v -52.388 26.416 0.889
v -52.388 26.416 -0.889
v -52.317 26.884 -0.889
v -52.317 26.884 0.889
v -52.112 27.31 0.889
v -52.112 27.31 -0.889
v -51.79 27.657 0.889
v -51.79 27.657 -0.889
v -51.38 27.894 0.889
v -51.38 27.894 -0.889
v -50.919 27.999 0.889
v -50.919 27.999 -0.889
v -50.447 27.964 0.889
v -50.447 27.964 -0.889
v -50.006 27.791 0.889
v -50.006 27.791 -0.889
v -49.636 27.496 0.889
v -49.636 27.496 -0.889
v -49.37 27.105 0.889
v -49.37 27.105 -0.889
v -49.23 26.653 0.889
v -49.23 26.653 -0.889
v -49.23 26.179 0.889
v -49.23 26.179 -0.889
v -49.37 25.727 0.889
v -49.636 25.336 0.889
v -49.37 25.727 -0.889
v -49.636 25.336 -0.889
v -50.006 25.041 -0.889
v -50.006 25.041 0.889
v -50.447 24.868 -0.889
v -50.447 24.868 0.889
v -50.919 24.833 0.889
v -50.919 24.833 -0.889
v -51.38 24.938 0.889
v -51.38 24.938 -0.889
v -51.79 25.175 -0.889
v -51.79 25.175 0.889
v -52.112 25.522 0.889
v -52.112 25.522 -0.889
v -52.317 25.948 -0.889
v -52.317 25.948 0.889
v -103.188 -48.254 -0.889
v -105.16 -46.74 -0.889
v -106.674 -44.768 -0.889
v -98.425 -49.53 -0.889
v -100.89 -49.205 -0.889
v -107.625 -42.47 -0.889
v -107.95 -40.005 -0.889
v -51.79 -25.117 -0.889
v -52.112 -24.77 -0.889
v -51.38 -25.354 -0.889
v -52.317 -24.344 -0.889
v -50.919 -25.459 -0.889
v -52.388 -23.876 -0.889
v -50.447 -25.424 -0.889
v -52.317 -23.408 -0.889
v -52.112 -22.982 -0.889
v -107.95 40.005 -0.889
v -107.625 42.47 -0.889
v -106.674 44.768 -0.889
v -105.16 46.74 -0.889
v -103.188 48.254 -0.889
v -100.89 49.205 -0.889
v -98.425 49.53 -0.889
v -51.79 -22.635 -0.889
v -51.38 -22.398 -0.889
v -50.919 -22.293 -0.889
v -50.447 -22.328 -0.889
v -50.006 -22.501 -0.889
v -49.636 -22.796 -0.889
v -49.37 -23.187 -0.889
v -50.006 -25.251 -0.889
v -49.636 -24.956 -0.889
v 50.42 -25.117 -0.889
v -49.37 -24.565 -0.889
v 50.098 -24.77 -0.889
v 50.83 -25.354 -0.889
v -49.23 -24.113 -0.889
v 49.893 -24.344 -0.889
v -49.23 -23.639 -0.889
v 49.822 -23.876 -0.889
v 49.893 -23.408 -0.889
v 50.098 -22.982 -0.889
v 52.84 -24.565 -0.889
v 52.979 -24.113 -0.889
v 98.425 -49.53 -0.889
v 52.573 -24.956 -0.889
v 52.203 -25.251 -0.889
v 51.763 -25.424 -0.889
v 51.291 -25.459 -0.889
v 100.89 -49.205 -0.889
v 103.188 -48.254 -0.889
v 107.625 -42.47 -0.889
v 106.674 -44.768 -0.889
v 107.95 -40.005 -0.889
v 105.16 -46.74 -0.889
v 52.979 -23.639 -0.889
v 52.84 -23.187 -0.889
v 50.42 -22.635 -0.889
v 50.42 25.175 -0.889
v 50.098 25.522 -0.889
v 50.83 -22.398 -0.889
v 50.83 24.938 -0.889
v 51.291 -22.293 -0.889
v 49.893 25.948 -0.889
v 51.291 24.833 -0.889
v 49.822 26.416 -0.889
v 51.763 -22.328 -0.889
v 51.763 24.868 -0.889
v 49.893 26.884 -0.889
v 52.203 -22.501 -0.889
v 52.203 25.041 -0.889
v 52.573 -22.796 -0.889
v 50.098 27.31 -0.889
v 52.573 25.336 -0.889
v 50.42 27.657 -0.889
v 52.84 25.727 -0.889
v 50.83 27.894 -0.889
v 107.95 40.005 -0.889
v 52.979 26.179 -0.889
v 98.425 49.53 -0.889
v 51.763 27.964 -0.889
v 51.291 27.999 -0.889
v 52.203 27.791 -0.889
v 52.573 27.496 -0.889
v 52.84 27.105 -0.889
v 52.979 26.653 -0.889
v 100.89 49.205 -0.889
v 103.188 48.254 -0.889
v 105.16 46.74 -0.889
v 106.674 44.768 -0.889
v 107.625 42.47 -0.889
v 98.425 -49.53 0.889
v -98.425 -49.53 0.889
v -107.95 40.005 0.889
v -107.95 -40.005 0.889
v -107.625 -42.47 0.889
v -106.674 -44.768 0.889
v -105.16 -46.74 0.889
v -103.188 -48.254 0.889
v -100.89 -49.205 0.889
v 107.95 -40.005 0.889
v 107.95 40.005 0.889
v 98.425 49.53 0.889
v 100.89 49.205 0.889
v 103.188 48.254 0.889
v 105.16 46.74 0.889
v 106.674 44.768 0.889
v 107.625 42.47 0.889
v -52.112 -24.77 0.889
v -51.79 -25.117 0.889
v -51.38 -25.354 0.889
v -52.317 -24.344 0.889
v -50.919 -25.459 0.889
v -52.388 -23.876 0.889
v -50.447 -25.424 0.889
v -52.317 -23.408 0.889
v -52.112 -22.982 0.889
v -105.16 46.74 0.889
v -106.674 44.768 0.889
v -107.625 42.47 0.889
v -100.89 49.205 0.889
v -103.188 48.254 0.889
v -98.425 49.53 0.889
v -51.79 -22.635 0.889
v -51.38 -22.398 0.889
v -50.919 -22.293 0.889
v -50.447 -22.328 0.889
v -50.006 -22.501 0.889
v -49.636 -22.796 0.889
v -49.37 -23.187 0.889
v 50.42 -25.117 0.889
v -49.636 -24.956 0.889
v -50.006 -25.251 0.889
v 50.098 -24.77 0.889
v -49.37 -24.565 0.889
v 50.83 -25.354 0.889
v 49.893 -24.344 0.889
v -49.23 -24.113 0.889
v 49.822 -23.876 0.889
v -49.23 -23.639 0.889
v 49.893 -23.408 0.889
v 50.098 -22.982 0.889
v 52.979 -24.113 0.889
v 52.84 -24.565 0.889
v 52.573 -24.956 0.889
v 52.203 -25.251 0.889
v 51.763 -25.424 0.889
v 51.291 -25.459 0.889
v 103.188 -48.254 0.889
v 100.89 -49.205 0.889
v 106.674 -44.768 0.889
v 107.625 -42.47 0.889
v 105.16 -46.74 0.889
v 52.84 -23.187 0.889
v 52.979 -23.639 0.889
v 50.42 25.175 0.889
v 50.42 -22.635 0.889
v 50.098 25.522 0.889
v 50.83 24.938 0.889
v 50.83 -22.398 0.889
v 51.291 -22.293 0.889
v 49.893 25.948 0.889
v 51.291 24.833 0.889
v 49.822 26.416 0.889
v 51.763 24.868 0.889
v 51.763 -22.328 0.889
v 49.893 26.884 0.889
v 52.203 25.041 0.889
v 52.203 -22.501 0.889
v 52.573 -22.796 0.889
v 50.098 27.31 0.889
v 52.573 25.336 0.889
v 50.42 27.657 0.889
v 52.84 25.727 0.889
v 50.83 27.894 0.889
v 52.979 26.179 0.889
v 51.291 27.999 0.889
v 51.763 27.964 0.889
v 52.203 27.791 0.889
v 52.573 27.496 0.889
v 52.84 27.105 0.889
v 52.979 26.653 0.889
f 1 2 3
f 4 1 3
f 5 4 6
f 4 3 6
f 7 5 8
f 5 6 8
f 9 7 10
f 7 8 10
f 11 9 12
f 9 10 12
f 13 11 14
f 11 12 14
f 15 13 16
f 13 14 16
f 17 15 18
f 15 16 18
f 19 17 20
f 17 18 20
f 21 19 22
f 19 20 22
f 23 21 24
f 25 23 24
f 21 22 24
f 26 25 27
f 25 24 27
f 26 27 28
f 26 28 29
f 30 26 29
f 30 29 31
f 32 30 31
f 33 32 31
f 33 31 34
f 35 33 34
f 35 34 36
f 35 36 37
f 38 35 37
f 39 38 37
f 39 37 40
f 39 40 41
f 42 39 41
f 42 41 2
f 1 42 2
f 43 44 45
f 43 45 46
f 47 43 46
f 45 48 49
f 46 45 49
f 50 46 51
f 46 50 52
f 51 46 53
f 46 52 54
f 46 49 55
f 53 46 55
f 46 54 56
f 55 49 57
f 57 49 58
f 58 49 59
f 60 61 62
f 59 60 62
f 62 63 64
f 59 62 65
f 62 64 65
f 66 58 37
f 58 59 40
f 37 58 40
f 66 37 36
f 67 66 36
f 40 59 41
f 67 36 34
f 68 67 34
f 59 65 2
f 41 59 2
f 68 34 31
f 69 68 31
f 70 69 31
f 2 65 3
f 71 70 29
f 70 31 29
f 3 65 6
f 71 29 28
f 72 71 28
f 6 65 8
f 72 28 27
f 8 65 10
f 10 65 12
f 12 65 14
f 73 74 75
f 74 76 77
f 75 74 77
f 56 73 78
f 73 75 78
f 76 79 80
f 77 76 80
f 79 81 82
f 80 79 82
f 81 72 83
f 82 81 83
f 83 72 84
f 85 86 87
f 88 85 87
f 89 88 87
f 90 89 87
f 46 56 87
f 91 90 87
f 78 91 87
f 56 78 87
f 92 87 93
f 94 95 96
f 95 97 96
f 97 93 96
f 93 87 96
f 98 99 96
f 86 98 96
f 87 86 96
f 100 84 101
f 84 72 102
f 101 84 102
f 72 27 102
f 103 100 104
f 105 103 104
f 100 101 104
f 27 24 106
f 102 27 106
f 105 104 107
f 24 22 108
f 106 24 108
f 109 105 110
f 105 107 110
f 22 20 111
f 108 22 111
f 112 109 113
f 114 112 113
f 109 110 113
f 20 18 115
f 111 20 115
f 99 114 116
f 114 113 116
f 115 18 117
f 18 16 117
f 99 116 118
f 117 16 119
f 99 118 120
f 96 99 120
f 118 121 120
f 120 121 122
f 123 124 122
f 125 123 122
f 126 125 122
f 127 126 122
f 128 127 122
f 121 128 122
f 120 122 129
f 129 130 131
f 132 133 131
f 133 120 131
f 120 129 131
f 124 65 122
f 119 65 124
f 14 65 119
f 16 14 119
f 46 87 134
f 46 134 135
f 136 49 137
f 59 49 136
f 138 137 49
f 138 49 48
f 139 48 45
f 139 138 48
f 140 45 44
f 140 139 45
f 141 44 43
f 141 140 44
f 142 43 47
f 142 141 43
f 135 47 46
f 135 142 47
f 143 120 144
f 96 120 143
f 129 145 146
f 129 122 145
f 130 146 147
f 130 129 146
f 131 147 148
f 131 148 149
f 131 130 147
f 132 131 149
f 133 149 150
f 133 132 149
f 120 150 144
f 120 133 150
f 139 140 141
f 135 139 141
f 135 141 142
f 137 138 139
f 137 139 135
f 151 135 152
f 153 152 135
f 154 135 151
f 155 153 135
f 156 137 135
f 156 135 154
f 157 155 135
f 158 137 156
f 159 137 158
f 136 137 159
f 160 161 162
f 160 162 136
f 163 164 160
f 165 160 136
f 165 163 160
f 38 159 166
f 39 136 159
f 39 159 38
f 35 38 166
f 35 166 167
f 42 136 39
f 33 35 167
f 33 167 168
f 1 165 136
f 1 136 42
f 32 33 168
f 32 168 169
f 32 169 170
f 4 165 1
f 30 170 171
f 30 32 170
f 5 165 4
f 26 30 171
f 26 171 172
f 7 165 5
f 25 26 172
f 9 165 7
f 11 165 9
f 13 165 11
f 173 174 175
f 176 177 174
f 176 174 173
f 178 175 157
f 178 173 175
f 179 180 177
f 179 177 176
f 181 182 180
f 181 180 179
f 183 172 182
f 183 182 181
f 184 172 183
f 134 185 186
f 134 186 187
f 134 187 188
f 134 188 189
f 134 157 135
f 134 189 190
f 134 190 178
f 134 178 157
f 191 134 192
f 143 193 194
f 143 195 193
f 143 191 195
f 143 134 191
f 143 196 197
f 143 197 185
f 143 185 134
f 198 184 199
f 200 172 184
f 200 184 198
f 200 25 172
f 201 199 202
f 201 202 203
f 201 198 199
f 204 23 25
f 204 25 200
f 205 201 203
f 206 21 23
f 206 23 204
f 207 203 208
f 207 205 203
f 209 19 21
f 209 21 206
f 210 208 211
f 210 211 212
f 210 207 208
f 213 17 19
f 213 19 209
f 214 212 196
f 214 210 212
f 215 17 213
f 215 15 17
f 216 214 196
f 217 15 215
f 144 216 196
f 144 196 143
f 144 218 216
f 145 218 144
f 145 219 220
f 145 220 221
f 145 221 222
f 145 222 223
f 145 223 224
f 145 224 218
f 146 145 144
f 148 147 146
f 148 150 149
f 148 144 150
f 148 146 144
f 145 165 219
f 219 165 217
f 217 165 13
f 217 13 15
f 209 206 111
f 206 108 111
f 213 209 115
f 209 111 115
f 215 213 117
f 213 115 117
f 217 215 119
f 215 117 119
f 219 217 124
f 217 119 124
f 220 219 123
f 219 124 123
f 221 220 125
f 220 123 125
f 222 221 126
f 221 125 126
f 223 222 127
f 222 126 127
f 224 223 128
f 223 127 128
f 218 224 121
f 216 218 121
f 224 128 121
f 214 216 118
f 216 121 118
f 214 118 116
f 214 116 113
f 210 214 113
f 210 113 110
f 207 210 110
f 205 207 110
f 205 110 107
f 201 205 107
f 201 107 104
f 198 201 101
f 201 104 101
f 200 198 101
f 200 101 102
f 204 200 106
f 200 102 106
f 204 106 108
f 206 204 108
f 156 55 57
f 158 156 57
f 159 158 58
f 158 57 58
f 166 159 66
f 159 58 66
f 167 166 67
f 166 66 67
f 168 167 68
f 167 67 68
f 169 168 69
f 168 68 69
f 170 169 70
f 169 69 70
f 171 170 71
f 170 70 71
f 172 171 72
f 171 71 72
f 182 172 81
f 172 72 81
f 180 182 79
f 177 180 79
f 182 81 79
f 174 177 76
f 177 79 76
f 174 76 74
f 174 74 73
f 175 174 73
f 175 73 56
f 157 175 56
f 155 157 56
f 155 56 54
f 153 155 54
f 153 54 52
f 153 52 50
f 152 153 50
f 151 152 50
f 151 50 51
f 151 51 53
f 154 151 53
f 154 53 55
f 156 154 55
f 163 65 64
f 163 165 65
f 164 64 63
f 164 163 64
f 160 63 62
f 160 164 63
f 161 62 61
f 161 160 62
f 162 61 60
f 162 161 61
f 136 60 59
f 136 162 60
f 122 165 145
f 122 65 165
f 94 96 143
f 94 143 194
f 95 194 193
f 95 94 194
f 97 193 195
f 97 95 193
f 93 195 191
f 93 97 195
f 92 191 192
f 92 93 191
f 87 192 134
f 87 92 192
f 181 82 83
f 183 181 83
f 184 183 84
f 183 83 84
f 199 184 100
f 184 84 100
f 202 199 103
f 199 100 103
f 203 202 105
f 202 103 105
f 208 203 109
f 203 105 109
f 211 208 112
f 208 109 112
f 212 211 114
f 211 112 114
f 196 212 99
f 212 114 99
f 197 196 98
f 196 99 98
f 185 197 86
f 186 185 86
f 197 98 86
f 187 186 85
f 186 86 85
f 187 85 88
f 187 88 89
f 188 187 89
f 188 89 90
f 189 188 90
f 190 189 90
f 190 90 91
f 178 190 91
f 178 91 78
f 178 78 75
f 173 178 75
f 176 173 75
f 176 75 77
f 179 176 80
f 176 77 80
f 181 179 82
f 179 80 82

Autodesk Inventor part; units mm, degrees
ref_plane "YZ Plane" through (0, 0, 0) normal (1, 0, 0) x (0, 1, 0)
ref_plane "XZ Plane" through (0, 0, 0) normal (0, 1, 0) x (-1, 0, 0)
ref_plane "XY Plane" through (0, 0, 0) normal (0, 0, 1) x (1, 0, 0)
sketch "Sketch1" plane through (0, 0, 0) normal (0, 0, 1) x (1, 0, 0)
  line L0 (-107.95, 49.53) -> (107.95, 49.53)
  line L1 (107.95, 49.53) -> (107.95, -49.53)
  line L2 (107.95, -49.53) -> (-107.95, -49.53)
  line L3 (-107.95, -49.53) -> (-107.95, 49.53)
  line L4 (-107.95, 49.53) -> (107.95, -49.53) construction
  point P0 (0, 0)
  point P1 (0, 0)
  dimension "d0" = 99.06
  dimension "d1" = 215.9
extrude "Extrusion1" add sketch "Sketch1" along normal mid plane 1.778
fillet "Fillet1" radius 9.525 4 edges at (107.95, 49.53, 0) (107.95, -49.53, 0) (-107.95, 49.53, 0) (-107.95, -49.53, 0)
sketch "Sketch2" plane through (0, 0, -0.889) normal (0, 0, -1) x (-1, 0, 0)
  line L0 (107.95, 40.005) -> (107.95, -40.005) projected
  line L1 (-98.425, 49.53) -> (98.425, 49.53) projected
  line L2 (-107.95, -40.005) -> (-107.95, 40.005) projected
  line L3 (98.425, -49.53) -> (-98.425, -49.53) projected
  circle A0 centre (-51.4096, 26.416) radius 1.5875
  circle A1 centre (50.8, 26.416) radius 1.5875
  circle A2 centre (-51.4096, -23.876) radius 1.5875
  circle A3 centre (50.8, -23.876) radius 1.5875
  line L4 (-51.4096, 26.416) -> (50.8, 26.416) construction
  line L5 (50.8, 26.416) -> (50.8, -23.876) construction
  line L6 (50.8, -23.876) -> (-51.4096, -23.876) construction
  line L7 (-51.4096, -23.876) -> (-51.4096, 26.416) construction
  point P0 (0, 0)
  dimension "d5" = 56.5404
  dimension "d6" = 23.114
  dimension "d7" = 25.654
  dimension "d8" = 57.15
  dimension "d9" = 3.175
extrude "Extrusion2" cut sketch "Sketch2" against normal up to next
properties part number "Plate"
